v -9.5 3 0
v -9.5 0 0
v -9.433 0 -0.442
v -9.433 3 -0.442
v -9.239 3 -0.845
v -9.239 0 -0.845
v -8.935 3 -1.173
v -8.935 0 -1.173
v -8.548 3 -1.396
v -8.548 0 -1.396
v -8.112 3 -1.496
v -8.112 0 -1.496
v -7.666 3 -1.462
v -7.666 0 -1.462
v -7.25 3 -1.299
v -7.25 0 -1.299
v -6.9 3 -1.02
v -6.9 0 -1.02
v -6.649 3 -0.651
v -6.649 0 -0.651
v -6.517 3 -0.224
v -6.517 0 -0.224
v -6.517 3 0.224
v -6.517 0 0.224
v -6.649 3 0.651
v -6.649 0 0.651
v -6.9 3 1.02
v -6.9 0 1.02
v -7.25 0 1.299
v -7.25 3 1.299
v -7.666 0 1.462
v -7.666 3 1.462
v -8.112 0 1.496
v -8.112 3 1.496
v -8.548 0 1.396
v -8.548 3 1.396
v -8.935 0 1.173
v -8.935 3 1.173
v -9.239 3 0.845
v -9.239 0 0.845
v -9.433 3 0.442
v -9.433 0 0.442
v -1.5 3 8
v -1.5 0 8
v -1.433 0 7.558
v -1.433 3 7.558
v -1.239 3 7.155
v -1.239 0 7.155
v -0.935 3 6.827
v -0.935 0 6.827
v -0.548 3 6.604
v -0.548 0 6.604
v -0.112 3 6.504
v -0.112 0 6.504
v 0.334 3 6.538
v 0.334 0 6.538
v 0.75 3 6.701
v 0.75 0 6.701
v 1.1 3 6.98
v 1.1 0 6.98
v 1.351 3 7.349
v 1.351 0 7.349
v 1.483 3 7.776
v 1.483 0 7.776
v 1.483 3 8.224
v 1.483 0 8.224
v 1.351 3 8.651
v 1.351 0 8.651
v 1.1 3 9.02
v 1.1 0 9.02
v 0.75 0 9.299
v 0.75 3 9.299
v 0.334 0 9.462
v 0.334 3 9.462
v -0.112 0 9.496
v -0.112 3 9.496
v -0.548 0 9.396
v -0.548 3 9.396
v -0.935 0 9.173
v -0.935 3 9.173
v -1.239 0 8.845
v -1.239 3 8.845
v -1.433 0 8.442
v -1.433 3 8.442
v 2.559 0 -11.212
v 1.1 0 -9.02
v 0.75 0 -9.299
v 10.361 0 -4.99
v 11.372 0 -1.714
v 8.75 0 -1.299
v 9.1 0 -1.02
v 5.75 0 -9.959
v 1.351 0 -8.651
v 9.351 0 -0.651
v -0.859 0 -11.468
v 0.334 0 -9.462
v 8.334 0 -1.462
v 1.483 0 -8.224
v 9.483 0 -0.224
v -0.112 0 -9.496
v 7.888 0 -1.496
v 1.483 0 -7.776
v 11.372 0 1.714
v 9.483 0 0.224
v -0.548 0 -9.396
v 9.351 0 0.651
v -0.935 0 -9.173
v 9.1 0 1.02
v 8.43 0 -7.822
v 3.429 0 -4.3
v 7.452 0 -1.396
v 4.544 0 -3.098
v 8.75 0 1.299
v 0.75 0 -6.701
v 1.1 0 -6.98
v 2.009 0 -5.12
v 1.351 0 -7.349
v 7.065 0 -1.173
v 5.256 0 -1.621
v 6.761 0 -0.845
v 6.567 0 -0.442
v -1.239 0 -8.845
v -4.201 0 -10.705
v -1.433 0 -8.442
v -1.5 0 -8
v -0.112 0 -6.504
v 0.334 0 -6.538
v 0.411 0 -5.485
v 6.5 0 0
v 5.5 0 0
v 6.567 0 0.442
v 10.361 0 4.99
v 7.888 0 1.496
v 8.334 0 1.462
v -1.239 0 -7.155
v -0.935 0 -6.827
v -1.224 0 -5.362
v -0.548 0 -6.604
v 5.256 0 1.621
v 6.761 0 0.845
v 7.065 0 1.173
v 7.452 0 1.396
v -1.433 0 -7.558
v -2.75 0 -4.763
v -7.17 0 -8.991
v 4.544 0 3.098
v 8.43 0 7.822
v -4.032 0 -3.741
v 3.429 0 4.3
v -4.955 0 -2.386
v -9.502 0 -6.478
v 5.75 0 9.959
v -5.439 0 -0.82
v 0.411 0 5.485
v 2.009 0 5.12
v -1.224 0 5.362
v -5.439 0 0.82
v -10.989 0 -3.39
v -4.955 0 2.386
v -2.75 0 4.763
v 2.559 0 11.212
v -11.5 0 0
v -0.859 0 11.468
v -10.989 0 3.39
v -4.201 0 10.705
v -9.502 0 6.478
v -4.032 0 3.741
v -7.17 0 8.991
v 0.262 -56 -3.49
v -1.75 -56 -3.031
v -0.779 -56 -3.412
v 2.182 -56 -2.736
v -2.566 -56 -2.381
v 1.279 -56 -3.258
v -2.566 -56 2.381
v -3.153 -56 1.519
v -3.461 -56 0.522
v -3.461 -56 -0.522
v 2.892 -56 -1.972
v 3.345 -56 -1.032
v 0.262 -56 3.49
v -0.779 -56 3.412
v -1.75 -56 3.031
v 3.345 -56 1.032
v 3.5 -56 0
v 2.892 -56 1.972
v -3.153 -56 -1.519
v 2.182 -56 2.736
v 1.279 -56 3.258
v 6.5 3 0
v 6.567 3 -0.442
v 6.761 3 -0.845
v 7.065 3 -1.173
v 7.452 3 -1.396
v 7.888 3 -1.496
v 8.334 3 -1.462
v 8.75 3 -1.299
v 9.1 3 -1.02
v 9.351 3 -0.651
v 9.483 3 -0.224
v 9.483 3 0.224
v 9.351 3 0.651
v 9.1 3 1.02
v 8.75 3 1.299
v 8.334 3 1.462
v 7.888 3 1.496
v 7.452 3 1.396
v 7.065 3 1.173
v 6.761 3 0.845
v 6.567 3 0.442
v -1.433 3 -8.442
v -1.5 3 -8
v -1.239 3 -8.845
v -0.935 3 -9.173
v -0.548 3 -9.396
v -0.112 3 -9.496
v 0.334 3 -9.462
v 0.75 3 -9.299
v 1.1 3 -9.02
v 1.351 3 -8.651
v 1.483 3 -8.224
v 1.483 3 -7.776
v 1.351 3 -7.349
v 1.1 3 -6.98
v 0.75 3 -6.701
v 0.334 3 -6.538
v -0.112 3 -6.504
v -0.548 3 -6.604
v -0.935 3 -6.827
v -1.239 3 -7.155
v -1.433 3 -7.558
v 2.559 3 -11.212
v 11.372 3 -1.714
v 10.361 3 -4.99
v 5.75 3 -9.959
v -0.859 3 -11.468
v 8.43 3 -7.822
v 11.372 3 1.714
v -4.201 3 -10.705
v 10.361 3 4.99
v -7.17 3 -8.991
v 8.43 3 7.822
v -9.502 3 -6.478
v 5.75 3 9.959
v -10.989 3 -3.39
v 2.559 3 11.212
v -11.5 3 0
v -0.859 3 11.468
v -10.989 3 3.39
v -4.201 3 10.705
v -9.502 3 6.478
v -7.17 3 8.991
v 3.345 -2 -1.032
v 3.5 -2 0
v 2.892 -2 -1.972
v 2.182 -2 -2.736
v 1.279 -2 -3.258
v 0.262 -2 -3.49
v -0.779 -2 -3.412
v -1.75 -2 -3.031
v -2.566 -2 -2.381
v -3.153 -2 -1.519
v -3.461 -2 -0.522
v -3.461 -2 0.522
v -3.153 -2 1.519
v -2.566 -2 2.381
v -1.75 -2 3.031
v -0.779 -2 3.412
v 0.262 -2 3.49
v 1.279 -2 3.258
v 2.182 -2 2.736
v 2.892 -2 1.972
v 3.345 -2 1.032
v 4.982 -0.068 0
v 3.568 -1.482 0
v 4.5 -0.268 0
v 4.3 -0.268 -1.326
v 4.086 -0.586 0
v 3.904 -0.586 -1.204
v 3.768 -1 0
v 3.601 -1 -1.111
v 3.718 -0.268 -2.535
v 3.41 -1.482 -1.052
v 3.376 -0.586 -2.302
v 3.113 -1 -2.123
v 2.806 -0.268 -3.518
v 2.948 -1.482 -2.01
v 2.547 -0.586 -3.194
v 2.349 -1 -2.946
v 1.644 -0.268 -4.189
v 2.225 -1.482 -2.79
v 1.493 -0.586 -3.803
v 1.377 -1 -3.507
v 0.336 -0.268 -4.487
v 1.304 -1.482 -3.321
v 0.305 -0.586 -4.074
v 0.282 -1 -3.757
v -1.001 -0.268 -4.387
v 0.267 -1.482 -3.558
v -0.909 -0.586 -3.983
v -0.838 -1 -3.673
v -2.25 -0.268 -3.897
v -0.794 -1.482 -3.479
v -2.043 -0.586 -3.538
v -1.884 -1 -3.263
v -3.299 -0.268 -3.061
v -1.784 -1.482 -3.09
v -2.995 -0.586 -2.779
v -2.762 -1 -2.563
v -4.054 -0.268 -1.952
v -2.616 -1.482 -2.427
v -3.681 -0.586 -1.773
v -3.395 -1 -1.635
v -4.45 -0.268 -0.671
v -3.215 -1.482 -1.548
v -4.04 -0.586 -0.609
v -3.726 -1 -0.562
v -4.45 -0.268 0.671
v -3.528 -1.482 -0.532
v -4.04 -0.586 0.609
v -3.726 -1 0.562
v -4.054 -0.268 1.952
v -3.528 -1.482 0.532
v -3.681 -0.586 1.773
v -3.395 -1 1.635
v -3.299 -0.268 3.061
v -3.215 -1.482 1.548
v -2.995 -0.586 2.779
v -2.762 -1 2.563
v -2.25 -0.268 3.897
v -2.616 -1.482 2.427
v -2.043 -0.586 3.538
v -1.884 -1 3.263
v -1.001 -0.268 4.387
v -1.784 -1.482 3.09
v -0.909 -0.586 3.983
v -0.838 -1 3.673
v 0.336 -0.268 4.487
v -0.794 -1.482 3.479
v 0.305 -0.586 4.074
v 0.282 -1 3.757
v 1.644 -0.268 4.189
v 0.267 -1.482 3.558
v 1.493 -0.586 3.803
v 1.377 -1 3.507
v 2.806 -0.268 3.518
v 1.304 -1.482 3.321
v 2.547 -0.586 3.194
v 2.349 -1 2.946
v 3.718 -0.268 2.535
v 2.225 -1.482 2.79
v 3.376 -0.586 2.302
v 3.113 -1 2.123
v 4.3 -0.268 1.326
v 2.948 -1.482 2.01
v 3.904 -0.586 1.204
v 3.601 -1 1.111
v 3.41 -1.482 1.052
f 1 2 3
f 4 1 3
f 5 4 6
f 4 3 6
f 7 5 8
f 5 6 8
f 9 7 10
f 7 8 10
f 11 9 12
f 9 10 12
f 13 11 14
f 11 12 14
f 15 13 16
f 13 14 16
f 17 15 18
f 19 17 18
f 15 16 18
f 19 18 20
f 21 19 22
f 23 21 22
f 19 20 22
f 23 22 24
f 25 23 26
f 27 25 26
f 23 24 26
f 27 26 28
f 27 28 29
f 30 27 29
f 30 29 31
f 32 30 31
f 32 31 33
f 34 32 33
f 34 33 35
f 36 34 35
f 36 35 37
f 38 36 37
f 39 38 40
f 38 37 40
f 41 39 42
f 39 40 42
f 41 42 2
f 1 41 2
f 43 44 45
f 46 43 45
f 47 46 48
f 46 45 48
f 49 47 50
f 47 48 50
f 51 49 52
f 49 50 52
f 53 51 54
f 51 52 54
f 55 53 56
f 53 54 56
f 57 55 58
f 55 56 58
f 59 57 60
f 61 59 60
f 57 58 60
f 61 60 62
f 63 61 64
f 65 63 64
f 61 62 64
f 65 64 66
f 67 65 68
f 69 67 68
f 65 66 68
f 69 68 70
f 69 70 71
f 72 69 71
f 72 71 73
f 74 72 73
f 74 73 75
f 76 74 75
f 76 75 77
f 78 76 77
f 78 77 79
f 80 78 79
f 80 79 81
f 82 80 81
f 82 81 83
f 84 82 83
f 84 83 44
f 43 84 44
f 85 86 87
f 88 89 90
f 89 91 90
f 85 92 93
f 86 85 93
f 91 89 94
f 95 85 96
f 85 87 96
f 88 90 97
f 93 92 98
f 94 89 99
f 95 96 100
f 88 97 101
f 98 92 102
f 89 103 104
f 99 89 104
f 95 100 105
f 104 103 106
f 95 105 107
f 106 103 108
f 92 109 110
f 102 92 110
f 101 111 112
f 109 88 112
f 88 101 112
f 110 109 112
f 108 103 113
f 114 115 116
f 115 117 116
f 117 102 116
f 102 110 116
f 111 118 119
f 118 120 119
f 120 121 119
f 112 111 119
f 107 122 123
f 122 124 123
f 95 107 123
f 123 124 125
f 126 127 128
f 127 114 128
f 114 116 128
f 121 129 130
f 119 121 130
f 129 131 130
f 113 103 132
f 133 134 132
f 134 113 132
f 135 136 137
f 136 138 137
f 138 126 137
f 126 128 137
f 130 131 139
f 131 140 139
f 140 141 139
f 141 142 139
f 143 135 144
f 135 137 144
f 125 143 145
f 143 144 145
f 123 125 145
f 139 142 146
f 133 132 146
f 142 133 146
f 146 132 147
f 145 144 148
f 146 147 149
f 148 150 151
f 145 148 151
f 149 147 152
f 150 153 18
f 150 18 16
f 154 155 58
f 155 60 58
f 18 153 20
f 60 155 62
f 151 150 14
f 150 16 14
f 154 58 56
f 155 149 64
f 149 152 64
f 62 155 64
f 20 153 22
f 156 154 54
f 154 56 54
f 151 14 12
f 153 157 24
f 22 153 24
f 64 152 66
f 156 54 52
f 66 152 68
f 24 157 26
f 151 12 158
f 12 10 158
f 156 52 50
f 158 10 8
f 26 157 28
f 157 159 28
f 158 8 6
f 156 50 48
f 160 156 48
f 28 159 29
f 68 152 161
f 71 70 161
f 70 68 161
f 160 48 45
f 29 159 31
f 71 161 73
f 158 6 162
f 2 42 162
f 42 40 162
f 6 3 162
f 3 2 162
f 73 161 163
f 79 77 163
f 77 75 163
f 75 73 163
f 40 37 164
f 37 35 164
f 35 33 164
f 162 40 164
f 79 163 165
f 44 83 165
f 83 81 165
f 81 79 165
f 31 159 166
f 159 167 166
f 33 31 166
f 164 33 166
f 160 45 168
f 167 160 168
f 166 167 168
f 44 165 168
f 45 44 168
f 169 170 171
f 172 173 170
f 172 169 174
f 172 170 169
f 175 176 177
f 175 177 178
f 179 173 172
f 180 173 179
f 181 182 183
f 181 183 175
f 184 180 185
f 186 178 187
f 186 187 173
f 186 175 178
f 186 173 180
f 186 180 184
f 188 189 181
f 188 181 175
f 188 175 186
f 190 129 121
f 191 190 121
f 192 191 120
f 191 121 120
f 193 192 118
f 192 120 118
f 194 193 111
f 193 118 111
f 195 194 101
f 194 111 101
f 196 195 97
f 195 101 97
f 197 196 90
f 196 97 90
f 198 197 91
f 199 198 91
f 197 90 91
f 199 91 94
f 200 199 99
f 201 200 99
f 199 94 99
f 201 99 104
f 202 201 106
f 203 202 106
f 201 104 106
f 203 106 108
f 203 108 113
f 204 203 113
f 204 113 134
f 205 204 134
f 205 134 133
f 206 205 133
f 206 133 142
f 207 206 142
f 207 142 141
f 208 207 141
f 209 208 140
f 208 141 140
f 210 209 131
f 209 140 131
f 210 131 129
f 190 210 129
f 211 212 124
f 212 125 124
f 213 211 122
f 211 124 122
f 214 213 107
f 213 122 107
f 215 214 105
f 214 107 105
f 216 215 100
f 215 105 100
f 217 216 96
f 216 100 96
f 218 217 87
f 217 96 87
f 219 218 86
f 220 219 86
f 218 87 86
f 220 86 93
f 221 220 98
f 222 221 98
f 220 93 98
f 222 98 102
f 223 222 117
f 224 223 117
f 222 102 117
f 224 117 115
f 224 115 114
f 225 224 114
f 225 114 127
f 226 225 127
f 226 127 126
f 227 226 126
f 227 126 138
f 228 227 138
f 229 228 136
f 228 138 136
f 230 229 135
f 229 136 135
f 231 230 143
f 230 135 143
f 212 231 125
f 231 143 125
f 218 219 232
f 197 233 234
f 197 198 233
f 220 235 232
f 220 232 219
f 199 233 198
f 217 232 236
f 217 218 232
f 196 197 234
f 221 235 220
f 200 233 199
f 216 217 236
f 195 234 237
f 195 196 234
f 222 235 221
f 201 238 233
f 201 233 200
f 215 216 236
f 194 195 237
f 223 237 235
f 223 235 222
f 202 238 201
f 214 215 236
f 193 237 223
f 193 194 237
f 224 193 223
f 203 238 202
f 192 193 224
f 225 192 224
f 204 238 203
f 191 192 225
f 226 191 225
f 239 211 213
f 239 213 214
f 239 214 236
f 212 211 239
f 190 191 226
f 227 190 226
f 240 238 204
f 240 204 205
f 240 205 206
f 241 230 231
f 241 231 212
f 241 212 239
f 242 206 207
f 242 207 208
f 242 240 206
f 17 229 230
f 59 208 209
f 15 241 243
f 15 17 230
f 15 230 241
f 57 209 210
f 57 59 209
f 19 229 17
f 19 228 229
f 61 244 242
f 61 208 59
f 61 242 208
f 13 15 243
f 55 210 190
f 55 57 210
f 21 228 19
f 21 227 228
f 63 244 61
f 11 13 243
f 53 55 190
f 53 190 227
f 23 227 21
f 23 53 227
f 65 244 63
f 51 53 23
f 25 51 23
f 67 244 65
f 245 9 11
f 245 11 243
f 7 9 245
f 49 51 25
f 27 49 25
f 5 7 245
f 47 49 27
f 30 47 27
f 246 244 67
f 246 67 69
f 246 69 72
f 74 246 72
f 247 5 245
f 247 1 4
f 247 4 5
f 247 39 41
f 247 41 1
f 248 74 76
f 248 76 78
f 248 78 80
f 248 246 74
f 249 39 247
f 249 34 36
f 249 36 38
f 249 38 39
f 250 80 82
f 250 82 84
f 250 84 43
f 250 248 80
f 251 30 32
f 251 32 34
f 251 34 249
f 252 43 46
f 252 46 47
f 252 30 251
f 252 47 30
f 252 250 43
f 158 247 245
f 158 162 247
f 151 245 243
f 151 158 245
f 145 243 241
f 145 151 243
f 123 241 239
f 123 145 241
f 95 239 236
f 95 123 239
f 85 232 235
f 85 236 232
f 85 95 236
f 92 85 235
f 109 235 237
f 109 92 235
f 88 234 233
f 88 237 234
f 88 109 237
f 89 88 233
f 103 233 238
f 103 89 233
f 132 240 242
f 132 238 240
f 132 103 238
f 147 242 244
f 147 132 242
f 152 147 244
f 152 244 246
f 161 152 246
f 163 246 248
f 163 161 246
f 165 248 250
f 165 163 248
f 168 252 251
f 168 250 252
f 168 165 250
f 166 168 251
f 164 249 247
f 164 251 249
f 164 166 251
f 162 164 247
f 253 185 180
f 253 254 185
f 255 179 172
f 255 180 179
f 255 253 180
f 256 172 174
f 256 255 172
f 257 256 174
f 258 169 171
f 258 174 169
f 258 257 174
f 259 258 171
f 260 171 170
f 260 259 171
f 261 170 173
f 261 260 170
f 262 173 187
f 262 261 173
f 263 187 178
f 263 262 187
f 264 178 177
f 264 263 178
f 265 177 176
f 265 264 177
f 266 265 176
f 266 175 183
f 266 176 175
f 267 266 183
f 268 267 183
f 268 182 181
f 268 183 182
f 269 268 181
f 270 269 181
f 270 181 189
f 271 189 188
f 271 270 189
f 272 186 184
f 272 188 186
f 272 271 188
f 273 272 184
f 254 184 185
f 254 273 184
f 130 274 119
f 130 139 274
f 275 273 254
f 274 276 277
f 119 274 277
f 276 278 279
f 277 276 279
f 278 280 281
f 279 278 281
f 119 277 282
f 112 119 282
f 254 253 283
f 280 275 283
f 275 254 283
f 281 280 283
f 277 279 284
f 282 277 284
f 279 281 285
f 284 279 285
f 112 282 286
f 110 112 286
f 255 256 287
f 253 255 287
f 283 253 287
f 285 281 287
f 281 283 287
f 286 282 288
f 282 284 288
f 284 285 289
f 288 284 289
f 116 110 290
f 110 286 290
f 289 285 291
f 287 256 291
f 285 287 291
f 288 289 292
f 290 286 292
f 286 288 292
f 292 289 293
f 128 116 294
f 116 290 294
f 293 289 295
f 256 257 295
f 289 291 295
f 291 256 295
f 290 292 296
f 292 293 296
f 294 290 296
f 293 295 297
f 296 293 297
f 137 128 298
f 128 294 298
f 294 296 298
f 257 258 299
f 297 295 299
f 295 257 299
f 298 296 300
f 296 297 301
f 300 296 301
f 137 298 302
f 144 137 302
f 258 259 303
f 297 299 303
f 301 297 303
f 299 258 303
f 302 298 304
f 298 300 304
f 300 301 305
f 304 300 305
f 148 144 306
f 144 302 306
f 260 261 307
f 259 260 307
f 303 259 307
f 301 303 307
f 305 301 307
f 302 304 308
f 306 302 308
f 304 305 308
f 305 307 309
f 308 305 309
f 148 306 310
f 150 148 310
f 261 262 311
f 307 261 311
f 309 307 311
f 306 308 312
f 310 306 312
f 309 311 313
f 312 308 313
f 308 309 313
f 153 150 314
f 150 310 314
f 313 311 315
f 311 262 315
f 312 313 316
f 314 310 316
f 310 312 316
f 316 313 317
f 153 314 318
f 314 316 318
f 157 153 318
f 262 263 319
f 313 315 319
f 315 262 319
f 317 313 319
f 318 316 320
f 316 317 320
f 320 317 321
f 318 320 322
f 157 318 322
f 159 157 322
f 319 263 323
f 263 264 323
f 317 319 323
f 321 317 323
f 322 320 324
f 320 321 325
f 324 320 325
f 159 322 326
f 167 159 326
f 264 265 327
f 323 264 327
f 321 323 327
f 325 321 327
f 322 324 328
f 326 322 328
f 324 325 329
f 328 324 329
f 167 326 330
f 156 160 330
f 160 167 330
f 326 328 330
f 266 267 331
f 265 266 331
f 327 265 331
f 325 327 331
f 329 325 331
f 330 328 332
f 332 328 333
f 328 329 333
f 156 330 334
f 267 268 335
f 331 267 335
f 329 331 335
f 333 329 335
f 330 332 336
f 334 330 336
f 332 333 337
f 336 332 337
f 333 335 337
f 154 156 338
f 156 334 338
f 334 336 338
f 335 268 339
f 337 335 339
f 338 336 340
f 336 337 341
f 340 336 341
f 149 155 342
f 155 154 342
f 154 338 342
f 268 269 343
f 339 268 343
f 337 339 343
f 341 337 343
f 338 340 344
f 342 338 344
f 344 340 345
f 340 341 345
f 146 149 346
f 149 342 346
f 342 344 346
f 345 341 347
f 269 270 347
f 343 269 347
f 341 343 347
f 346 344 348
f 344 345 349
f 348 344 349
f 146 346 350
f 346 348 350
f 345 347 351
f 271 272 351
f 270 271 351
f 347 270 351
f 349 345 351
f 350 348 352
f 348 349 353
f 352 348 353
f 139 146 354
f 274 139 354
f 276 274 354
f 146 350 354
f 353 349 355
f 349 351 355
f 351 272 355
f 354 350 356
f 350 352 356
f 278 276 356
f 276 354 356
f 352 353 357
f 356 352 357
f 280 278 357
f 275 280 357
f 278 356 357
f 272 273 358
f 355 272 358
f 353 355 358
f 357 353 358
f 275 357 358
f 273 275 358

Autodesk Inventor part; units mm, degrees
ref_plane "YZ Plane" through (0, 0, 0) normal (1, 0, 0) x (0, 1, 0)
ref_plane "XZ Plane" through (0, 0, 0) normal (0, 1, 0) x (-1, 0, 0)
ref_plane "XY Plane" through (0, 0, 0) normal (0, 0, 1) x (1, 0, 0)
sketch "Sketch1" plane through (0, 0, 0) normal (0, 1, 0) x (-1, 0, 0)
  circle A0 centre (0, 0) radius 11.5
  circle A1 centre (0, 0) radius 8
  circle A2 centre (0, -8) radius 1.5
  circle A3 centre (8, 0) radius 1.5
  circle A4 centre (0, 8) radius 1.5
  circle A5 centre (-8, 0) radius 1.5
  dimension "d0" = 23
  dimension "d1" = 16
  dimension "d2" = 3
  dimension "d3" = 3
  dimension "d4" = 3
  dimension "d5" = 3
extrude "Extrusion1" add sketch "Sketch1" along normal blind 3 contours A0 | A3 A1 A2 A5 A4
sketch "Sketch2" plane through (0, 0, 0) normal (0, -1, 0) x (1, 0, 0)
  circle A0 centre (0, 0) radius 3.5
  dimension "d8" = 7
extrude "Extrusion2" add sketch "Sketch2" along normal blind 56
fillet "Fillet2" radius 2 1 edges at (-3.5, 0, 0)
sketch "Sketch4" plane through (0, 0, 0) normal (0, -1, 0) x (1, 0, 0)
  circle A0 centre (0, 0) radius 3.5 projected
  circle A1 centre (0, 0) radius 11.5 projected
  circle A2 centre (8, 0) radius 1.5 projected
  circle A3 centre (0, -8) radius 1.5 projected
  circle A4 centre (-8, 0) radius 1.5 projected
  circle A5 centre (0, 8) radius 1.5 projected
properties part number "landing_gear"
